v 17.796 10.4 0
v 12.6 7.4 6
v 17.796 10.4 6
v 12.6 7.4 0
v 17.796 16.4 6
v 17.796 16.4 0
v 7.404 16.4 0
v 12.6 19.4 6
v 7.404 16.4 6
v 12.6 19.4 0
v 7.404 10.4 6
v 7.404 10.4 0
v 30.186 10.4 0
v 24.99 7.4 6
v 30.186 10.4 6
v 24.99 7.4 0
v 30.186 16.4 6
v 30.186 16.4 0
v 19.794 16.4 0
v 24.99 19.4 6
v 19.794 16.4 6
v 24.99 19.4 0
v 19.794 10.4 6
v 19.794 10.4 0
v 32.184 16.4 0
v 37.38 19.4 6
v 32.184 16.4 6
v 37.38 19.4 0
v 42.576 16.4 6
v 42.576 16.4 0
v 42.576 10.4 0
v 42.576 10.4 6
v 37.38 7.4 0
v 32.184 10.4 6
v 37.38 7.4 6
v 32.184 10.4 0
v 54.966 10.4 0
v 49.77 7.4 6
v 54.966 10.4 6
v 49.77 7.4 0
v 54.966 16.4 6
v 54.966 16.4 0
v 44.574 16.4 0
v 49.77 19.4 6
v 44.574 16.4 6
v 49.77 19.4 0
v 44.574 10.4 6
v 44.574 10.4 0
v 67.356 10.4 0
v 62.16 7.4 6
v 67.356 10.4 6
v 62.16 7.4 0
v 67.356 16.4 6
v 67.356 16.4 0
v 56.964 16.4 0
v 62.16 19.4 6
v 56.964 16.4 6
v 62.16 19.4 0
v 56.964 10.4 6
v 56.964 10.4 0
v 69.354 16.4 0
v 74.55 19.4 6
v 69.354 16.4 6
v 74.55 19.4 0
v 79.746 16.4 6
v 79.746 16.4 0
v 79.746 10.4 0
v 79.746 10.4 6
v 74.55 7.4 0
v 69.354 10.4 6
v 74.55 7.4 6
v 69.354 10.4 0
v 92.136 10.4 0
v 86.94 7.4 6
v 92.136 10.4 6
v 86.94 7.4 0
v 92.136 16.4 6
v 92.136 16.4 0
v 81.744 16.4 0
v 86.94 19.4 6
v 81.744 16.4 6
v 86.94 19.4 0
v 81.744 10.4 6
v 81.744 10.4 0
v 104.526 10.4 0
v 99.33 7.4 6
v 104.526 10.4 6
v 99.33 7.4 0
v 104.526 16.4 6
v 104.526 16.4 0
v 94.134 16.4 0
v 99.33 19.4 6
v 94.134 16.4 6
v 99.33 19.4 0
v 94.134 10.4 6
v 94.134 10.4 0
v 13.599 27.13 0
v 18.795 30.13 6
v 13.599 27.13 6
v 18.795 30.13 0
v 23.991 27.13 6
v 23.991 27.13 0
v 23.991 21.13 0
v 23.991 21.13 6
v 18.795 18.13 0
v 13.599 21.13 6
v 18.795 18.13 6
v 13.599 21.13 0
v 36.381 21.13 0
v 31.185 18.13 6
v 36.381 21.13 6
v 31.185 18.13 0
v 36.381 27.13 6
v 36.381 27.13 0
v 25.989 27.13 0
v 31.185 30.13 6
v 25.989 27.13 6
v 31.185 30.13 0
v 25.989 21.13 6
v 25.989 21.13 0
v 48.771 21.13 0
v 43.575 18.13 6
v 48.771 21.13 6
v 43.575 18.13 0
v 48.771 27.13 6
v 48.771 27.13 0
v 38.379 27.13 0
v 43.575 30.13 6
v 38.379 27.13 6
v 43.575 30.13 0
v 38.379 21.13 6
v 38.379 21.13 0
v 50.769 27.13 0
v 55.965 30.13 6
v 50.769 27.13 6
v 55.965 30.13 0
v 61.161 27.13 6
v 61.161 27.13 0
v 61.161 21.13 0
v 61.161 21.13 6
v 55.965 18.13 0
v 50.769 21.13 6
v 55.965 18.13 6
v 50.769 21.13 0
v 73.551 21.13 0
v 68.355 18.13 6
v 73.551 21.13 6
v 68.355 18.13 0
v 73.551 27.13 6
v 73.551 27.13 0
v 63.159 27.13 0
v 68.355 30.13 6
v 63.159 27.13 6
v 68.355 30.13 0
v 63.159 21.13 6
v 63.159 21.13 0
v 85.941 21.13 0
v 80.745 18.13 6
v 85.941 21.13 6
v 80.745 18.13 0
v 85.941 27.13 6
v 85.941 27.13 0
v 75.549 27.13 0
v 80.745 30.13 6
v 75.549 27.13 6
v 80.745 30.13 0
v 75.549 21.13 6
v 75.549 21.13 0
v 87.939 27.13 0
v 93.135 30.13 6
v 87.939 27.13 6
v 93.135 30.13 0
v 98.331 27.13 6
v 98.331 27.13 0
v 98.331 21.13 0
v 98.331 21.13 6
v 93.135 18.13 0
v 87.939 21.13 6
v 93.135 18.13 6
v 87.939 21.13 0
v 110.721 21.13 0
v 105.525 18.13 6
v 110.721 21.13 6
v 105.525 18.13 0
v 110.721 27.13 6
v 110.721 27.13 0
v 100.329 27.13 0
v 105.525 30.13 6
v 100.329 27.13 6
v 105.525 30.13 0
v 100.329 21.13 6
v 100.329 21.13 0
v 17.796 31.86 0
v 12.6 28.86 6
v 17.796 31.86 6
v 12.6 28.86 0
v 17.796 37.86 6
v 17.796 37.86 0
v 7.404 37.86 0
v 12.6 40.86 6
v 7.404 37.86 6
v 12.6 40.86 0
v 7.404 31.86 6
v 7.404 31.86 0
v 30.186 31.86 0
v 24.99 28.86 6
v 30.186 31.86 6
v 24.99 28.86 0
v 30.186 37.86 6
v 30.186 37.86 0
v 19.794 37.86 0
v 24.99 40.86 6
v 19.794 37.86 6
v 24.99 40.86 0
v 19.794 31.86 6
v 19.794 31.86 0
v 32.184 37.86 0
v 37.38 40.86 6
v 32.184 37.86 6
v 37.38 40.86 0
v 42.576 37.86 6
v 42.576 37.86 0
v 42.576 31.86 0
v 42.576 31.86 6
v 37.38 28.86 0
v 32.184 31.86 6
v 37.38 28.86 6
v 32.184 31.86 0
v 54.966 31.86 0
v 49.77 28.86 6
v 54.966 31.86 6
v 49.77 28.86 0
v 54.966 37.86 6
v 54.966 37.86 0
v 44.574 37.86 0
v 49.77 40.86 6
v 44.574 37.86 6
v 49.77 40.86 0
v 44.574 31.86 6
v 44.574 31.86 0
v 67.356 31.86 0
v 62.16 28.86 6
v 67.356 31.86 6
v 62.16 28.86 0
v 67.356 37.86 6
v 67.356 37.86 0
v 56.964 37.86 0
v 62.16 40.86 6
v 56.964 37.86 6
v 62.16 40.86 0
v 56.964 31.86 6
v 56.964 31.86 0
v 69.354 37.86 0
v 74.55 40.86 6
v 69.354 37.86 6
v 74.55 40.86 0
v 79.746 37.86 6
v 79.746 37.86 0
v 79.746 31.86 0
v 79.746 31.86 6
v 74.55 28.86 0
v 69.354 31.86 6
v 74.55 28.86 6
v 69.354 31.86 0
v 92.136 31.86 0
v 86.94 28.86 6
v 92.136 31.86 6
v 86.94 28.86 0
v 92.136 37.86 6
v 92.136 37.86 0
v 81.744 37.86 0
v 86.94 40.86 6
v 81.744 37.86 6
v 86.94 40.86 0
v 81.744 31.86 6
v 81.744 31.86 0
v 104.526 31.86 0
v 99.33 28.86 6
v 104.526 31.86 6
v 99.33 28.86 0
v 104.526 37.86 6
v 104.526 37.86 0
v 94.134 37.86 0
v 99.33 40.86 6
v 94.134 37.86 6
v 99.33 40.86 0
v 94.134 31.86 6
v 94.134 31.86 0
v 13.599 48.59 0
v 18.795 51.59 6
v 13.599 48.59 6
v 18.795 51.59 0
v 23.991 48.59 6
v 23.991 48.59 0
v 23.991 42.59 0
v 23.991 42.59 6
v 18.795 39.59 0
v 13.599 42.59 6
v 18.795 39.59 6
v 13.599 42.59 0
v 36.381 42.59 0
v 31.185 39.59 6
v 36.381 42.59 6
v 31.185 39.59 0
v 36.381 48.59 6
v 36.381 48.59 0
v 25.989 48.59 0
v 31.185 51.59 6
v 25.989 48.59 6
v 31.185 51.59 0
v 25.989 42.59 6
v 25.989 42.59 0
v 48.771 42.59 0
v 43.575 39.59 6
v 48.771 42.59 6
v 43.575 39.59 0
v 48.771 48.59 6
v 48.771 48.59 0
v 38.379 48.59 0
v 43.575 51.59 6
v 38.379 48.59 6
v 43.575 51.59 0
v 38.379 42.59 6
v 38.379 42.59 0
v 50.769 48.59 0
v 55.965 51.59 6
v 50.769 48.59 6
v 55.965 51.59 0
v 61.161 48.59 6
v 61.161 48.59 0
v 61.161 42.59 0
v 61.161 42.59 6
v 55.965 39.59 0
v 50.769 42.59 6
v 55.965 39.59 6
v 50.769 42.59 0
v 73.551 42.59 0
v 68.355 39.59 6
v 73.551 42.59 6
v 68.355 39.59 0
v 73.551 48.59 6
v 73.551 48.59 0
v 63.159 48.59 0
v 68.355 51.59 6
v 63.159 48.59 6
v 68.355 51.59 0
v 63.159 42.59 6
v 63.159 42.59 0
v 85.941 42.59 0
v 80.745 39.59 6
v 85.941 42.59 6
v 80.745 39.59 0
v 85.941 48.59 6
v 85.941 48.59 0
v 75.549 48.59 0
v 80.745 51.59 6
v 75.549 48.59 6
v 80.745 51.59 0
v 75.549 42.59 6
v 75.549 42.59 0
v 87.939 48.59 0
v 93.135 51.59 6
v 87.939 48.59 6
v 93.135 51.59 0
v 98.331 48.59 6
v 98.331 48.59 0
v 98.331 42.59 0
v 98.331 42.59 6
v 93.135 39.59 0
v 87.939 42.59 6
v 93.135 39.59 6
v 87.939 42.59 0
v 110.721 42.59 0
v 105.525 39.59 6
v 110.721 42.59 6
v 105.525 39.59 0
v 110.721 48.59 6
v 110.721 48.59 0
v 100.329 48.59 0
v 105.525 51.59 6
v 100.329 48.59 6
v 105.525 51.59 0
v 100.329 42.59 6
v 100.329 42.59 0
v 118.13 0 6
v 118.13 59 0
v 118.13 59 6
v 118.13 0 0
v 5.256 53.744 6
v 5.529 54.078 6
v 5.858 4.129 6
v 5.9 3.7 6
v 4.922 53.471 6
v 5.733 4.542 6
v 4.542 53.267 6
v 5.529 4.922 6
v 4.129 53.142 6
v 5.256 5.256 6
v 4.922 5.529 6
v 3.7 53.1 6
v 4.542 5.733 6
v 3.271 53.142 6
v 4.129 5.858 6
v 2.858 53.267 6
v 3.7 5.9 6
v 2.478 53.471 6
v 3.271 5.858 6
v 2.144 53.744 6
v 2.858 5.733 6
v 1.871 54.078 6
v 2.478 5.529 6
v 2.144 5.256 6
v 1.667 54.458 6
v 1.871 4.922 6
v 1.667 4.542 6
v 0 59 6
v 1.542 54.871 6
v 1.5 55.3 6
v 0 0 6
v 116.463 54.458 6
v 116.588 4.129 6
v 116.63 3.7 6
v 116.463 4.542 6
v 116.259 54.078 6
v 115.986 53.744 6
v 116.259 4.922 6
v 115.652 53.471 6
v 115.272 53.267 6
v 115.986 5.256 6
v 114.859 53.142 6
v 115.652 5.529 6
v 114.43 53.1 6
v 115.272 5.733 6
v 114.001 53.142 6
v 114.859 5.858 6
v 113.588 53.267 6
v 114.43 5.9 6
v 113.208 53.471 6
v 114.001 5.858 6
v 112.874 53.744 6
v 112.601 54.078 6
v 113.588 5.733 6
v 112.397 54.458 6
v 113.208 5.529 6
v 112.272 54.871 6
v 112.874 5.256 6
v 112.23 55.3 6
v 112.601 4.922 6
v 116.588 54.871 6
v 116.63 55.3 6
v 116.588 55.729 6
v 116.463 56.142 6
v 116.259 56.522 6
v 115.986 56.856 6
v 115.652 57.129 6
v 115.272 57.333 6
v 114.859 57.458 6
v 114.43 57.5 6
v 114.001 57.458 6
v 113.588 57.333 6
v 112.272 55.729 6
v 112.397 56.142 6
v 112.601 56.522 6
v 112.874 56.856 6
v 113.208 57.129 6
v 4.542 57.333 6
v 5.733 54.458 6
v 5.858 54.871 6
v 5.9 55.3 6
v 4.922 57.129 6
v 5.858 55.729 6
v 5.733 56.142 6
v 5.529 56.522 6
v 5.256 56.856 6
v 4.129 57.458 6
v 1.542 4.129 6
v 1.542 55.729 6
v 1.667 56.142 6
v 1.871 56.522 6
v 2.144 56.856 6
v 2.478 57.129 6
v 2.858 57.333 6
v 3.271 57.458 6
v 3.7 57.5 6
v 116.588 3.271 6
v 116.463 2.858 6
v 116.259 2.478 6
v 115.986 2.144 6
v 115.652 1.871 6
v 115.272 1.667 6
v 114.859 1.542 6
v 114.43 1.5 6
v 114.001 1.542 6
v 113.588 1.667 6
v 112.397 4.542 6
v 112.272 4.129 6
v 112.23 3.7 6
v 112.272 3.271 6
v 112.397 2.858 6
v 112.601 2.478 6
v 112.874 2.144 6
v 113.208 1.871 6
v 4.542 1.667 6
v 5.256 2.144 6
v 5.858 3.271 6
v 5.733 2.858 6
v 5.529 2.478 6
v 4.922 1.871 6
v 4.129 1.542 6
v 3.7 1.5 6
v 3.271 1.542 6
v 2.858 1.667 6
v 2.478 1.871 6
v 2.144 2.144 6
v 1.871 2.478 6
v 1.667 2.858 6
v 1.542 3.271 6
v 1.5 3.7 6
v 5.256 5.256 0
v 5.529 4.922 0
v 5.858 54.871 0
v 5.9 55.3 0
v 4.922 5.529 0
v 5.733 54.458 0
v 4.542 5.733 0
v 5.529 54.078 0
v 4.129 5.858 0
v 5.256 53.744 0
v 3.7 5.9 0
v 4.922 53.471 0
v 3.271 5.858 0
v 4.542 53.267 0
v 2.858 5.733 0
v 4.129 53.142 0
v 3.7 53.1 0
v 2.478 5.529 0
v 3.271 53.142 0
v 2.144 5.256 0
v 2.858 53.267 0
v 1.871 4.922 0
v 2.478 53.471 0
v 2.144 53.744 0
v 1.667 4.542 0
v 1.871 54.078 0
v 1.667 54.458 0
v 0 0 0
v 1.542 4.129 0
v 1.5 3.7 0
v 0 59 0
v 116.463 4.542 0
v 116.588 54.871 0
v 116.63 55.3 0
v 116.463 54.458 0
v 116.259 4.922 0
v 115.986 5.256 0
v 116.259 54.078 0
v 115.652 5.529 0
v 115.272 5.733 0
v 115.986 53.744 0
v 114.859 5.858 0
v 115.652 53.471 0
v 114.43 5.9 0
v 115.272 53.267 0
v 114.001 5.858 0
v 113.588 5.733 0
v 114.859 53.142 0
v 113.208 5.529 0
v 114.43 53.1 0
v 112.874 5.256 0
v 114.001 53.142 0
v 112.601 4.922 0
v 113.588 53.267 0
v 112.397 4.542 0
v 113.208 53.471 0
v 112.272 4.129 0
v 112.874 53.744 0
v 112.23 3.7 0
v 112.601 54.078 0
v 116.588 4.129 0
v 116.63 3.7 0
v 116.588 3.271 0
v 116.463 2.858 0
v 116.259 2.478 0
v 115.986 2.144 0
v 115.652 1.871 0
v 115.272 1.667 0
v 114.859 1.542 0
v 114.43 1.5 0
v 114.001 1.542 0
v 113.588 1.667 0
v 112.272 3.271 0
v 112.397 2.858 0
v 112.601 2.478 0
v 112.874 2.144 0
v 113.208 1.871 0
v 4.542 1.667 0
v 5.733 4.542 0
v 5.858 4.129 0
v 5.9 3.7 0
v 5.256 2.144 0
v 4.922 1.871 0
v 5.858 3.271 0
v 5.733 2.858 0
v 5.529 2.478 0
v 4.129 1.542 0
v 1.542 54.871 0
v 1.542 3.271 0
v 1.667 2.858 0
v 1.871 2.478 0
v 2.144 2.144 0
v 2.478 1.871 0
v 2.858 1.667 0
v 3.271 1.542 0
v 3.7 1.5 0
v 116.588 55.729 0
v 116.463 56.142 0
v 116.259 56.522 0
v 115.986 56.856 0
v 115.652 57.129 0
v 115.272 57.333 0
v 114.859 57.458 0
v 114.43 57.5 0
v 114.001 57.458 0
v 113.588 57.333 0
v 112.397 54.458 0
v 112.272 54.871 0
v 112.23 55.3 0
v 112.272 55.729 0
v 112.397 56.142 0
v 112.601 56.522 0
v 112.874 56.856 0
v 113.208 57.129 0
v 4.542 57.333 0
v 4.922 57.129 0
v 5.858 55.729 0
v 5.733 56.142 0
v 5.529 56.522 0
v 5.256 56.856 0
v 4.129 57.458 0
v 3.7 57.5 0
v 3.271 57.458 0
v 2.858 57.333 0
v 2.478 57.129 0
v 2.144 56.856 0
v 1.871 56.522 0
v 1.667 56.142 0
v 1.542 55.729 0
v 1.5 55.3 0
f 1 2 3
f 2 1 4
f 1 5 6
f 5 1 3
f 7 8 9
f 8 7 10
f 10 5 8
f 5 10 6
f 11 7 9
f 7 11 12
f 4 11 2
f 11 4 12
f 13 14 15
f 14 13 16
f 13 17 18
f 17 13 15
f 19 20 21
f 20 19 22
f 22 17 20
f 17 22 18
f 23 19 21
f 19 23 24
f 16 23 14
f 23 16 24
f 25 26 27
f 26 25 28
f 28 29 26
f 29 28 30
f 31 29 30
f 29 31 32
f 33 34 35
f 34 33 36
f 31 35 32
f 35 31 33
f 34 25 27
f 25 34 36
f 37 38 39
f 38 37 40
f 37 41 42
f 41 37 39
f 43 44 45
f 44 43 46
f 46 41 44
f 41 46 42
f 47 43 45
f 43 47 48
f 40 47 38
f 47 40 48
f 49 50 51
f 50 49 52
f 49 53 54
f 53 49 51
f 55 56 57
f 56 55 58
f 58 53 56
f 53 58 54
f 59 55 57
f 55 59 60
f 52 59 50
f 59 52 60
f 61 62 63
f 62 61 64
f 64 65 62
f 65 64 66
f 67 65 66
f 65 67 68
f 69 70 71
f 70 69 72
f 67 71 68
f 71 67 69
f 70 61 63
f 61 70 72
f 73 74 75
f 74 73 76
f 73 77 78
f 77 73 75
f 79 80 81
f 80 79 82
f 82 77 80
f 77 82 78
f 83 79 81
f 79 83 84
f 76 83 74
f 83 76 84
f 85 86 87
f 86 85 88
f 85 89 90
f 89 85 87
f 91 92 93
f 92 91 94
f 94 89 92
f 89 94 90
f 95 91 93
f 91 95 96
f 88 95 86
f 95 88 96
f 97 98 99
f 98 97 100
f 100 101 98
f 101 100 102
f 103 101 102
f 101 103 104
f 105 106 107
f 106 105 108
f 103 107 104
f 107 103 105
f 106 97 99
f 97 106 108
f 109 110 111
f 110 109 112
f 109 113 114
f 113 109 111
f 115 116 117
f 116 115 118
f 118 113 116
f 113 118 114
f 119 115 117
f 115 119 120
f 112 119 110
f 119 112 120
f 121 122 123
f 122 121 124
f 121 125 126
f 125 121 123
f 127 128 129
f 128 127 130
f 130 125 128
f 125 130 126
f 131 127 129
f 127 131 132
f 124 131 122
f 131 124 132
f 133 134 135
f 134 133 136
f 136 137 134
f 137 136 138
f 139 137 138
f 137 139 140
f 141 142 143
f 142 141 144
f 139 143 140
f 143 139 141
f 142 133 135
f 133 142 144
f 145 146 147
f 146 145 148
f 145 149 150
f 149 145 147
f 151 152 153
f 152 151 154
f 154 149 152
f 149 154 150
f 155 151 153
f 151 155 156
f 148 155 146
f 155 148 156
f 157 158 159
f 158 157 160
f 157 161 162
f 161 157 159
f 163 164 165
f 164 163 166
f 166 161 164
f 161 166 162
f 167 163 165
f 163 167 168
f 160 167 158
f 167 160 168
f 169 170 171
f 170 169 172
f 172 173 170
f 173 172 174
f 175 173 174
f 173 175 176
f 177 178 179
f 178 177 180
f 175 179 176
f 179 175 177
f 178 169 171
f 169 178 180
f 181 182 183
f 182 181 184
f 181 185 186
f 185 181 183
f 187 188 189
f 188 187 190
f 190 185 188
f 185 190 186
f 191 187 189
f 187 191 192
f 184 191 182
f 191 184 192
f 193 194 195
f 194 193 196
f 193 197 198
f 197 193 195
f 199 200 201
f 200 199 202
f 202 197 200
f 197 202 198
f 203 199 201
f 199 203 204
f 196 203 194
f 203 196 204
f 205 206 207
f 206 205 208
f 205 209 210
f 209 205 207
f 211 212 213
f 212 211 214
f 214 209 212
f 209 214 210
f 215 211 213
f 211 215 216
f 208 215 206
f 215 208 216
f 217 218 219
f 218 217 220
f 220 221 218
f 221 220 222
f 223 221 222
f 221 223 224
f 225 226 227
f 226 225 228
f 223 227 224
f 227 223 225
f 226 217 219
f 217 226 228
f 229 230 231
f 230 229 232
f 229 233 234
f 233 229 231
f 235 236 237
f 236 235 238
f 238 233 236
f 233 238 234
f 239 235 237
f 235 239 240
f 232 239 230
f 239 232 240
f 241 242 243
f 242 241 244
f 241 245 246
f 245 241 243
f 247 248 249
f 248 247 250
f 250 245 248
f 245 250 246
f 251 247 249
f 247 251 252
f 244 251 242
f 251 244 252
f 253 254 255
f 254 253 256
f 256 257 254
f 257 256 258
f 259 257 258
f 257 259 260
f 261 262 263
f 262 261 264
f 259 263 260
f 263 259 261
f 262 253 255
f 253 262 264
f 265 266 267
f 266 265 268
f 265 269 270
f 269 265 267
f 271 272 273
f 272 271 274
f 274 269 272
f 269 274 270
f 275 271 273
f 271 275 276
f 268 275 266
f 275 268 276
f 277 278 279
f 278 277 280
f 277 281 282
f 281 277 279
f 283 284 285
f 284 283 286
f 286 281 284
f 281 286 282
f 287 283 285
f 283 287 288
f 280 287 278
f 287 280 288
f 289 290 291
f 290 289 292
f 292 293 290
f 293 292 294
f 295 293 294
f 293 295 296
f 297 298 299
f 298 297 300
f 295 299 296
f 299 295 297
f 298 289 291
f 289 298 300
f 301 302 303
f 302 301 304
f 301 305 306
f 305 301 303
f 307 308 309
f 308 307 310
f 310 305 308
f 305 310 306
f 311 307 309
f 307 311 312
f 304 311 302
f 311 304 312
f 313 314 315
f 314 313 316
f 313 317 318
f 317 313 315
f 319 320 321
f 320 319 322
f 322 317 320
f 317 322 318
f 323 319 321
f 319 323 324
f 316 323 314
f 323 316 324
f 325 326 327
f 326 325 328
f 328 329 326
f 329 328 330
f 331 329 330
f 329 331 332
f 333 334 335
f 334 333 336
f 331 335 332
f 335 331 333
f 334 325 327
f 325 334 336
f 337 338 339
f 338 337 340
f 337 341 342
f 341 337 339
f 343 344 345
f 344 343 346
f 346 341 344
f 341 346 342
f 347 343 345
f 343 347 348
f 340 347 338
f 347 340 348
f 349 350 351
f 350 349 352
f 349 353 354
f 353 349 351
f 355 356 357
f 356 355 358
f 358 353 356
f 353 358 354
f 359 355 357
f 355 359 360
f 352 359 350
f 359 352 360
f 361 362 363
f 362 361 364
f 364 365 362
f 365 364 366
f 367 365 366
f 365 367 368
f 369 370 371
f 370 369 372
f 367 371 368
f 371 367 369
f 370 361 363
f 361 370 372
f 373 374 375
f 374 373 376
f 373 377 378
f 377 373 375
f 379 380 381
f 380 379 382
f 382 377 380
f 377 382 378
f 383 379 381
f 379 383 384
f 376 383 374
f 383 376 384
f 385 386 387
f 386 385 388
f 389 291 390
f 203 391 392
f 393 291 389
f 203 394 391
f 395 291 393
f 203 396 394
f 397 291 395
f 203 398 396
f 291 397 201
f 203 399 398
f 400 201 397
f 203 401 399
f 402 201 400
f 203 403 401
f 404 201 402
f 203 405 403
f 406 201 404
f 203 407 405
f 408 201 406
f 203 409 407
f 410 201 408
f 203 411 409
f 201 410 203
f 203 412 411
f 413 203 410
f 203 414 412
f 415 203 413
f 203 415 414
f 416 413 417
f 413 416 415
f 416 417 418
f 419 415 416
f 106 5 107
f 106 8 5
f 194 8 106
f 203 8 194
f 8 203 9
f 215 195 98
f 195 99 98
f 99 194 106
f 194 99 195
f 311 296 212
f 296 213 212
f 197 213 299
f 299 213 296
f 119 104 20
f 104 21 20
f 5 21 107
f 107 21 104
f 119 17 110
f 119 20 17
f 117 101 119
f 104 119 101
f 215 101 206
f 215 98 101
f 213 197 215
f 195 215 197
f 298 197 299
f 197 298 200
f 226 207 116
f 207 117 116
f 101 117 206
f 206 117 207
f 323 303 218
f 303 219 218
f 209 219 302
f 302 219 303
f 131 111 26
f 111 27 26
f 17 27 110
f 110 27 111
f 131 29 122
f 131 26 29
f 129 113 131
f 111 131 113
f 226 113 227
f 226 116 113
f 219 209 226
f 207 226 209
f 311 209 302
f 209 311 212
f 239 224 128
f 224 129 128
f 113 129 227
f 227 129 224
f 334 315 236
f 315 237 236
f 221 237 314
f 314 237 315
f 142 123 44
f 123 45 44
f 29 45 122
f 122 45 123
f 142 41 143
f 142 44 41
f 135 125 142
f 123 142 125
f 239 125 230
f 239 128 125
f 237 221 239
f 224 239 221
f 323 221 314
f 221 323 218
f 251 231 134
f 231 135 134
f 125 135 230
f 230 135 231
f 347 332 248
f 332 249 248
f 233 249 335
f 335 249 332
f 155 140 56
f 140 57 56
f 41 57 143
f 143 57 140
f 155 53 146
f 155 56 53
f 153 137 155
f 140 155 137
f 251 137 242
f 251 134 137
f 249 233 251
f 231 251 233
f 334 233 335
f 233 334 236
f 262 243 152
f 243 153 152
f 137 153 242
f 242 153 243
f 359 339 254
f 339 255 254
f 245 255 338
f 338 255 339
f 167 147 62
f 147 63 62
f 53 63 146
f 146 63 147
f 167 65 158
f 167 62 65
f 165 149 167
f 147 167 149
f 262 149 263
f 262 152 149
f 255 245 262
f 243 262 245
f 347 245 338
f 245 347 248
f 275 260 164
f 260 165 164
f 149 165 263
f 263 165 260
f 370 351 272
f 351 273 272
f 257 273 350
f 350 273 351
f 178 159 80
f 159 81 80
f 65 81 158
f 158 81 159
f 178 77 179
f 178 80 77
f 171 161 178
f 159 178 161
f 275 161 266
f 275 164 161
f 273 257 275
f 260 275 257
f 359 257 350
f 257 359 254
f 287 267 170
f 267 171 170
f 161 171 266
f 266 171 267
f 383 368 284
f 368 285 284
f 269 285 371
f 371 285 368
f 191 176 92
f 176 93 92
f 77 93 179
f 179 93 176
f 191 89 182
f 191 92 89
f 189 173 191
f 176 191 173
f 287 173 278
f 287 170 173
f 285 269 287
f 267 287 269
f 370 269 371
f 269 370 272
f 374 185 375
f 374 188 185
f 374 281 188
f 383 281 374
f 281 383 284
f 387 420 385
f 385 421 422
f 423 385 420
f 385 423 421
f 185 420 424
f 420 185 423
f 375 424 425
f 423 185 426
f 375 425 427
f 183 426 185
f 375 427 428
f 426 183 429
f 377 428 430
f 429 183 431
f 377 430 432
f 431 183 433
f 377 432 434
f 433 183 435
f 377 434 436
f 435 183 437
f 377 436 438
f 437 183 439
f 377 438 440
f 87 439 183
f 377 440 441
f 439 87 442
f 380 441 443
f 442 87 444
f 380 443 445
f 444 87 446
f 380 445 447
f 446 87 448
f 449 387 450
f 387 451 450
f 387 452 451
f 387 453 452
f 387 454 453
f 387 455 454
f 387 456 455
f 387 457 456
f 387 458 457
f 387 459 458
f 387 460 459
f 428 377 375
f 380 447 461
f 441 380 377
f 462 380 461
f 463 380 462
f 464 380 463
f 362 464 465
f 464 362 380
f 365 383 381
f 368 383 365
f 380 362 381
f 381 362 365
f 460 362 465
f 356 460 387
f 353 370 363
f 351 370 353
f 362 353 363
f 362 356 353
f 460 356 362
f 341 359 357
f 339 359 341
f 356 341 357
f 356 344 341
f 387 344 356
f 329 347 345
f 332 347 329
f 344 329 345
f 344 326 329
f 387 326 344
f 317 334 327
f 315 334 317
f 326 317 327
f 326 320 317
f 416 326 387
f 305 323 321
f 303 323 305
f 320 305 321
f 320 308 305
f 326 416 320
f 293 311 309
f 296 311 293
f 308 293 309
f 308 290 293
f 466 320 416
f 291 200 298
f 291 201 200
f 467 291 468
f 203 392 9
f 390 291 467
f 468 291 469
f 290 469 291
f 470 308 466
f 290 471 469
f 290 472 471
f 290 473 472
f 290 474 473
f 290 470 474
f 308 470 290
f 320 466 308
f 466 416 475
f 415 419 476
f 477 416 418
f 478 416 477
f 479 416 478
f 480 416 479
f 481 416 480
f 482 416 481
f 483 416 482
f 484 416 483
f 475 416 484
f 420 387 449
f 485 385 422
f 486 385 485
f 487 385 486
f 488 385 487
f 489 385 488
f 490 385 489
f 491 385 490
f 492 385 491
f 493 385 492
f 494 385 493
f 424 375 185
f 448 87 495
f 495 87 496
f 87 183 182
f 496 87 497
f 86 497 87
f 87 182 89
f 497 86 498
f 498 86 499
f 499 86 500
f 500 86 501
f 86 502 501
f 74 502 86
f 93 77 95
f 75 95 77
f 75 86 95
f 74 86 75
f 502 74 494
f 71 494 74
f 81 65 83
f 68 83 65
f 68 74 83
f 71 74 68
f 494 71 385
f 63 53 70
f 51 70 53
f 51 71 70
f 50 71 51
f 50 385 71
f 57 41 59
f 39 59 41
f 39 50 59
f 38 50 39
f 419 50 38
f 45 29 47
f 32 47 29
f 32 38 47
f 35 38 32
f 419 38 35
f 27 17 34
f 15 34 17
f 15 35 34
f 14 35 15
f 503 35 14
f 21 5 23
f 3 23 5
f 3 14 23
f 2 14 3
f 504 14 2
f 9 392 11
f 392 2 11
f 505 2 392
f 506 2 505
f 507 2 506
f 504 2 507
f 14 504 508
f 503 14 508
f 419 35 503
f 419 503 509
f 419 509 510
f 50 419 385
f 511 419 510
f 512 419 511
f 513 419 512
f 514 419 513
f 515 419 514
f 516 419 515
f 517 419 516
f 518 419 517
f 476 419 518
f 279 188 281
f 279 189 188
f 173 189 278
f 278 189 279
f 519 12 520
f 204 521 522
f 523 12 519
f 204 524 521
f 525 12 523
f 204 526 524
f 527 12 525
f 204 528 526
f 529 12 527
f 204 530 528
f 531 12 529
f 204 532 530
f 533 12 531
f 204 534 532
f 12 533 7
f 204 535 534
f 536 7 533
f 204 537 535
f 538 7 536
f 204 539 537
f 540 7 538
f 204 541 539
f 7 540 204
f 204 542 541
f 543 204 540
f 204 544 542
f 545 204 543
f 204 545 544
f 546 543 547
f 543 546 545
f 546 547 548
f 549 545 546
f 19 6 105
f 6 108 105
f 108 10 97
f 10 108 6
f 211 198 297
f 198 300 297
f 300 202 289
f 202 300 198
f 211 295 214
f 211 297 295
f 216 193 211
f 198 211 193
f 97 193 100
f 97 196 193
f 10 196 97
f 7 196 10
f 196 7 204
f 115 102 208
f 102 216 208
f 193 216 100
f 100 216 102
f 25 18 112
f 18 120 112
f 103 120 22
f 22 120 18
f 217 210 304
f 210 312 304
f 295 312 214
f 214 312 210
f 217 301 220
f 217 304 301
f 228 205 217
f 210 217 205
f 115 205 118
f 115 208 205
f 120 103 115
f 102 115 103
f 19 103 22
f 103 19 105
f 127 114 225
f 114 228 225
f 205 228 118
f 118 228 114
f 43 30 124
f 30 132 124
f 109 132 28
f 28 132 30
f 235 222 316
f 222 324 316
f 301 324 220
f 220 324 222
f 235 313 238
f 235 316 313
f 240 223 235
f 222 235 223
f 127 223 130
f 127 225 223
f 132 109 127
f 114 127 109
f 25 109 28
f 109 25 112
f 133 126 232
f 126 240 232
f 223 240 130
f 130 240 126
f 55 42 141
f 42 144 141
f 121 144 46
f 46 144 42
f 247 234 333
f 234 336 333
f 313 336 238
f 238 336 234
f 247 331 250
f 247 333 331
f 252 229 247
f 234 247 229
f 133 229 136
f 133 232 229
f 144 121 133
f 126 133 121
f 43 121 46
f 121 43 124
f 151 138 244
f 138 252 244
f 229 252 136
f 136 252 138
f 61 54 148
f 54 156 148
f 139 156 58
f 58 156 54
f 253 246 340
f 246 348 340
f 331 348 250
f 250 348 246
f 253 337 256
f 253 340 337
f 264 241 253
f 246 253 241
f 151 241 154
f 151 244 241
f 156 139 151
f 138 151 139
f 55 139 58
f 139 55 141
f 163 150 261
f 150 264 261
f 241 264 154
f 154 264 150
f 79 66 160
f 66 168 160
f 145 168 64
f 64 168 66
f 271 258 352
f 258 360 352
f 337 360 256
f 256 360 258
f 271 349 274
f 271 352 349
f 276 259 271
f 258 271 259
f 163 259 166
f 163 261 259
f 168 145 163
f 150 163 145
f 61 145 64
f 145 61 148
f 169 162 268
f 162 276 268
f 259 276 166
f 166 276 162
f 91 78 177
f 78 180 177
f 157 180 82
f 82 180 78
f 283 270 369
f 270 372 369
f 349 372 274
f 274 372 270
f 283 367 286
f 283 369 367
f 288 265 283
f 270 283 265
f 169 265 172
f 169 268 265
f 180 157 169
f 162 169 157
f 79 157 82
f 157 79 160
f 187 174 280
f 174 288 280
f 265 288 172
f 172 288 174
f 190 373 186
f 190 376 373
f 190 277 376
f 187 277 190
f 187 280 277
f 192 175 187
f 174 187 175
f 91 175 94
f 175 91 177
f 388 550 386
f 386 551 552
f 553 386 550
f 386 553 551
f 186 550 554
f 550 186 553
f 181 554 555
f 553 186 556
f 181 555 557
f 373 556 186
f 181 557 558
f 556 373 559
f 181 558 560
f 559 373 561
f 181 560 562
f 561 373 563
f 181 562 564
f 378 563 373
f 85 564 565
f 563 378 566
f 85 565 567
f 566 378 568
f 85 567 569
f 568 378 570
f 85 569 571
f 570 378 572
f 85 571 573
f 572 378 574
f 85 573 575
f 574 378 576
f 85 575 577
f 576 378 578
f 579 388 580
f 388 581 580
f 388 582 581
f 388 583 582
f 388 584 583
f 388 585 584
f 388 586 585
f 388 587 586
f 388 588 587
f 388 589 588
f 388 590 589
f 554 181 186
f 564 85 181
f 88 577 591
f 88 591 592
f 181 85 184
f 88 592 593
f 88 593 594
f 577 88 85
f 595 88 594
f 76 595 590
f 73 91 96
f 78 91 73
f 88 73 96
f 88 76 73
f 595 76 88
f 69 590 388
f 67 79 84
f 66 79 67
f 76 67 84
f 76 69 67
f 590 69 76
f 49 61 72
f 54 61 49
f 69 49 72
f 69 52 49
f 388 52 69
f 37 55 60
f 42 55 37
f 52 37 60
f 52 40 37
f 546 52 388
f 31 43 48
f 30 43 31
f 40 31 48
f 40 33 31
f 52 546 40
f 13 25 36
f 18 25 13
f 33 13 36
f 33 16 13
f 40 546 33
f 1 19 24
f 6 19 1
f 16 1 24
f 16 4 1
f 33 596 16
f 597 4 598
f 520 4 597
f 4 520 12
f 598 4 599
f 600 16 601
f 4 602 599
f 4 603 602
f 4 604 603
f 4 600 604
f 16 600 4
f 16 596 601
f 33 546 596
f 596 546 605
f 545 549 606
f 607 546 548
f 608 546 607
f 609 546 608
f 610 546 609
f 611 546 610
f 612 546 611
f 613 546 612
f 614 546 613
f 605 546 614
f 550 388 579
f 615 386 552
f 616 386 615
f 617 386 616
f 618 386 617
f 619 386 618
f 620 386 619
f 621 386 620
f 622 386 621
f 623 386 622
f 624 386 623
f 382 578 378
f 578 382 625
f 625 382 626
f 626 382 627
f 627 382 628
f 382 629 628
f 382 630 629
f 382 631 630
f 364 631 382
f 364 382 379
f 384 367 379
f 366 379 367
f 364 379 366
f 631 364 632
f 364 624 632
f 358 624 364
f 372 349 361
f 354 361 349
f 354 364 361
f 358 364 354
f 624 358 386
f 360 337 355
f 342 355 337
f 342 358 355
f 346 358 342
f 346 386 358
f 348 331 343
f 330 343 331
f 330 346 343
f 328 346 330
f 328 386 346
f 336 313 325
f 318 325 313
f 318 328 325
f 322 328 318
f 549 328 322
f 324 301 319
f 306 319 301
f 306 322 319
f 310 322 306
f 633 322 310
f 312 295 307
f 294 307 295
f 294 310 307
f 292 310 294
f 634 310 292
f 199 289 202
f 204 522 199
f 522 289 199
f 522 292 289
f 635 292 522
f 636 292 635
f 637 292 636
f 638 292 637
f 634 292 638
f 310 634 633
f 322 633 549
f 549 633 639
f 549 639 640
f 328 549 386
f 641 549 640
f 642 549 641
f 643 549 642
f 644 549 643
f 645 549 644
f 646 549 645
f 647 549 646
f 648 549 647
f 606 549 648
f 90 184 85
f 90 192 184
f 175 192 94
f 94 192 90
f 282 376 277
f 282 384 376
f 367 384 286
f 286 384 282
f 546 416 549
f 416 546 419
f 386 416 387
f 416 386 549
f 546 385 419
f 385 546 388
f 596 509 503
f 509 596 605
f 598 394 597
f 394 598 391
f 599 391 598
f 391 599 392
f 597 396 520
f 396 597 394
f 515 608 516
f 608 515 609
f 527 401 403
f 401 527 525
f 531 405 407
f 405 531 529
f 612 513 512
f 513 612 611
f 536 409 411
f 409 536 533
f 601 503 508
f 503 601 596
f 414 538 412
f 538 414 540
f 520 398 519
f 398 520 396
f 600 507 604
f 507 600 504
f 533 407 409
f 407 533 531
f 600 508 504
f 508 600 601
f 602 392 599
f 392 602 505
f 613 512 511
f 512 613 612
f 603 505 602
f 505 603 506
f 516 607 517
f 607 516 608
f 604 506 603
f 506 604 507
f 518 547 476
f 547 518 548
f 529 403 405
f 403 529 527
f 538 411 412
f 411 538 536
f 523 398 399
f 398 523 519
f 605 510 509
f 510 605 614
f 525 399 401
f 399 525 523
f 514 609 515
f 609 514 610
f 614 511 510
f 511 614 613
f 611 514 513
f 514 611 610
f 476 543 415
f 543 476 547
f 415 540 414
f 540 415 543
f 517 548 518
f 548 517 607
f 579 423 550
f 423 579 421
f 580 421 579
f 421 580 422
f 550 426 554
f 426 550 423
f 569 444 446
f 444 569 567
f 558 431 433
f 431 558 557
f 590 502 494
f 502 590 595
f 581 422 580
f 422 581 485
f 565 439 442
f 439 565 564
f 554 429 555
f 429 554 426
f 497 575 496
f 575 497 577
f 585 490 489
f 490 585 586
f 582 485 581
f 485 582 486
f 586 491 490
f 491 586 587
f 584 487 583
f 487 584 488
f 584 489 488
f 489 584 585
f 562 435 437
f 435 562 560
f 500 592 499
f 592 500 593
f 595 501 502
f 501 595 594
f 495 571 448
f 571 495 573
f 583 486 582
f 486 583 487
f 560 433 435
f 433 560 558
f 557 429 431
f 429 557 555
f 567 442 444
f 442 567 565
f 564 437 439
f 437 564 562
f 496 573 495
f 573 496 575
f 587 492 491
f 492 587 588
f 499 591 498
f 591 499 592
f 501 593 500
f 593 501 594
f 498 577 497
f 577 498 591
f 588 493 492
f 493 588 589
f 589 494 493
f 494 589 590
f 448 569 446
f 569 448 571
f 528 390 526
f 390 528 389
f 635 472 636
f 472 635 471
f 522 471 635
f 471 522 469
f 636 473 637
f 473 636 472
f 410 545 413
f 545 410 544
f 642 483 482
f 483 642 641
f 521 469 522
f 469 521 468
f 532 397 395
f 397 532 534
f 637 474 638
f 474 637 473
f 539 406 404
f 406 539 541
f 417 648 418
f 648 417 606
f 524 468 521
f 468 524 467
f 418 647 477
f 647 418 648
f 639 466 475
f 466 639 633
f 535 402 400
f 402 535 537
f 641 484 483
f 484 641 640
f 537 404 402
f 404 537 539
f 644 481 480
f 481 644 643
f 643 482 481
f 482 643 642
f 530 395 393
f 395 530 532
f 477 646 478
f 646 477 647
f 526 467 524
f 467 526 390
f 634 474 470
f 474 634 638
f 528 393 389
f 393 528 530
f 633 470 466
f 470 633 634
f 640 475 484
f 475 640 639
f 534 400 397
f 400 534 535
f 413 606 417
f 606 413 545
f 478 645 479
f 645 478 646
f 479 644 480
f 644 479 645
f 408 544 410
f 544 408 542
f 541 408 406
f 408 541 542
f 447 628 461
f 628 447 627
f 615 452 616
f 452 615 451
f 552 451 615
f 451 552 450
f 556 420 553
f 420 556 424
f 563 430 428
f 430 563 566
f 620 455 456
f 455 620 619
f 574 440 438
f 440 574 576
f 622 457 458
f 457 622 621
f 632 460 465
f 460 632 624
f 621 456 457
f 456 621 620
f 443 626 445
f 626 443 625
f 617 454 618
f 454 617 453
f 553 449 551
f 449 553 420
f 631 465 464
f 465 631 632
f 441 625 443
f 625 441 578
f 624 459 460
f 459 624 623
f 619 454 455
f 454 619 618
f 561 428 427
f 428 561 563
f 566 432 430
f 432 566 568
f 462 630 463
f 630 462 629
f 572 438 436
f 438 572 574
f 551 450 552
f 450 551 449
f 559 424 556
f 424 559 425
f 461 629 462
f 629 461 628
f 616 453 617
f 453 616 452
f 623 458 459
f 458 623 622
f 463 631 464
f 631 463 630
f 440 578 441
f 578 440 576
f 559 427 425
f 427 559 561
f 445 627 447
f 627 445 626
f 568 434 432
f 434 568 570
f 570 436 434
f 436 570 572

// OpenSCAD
$fn = 32;

// ----------------------------------------------------------------------
// Honeycomb panel: 118.13 x 59 mm, 32 cells of 12 mm
// ----------------------------------------------------------------------

// --- parameters (mm) ---
panel_w = 118.13;         // panel width
panel_d = 59;             // panel depth
thick = 6;                // panel thickness
cell_r = 6;               // hex cell circumradius
pitch = 12.39;            // hex cell pitch (centre to centre)
web = 2;                  // web between the cells
columns = 8;              // columns of cells
rows = 4;                 // rows of cells
cell_count = 32;          // total cells
shift_x = 12.6;           // first cell offset in x
shift_y = 13.4;           // first cell offset in y
mount_d = 4.4;            // corner mounting holes
hole_off = 3.7;           // mounting hole offset from the corners

difference() {
  union() {
    cube([panel_w, panel_d, thick]);
  }
  /* hexagonal cells, point-up, cut right through the plate */
  for (row = [0 : rows - 1]) {
    for (col = [0 : columns - 1]) {
      translate([shift_x + col * pitch + (row % 2) * pitch / 2, shift_y + row * pitch * 0.866025, -2.5]) rotate([0, 0, 30]) cylinder(h = thick + 5, d = 2 * cell_r, $fn = 6);
    }
  }
  /* corner mounting holes, clear of the outer cell web */
  translate([3.7, 3.7, -2.5]) cylinder(h = thick + 5, d = mount_d);
  translate([114.43, 3.7, -2.5]) cylinder(h = thick + 5, d = mount_d);
  translate([3.7, 55.3, -2.5]) cylinder(h = thick + 5, d = mount_d);
  translate([114.43, 55.3, -2.5]) cylinder(h = thick + 5, d = mount_d);
}
